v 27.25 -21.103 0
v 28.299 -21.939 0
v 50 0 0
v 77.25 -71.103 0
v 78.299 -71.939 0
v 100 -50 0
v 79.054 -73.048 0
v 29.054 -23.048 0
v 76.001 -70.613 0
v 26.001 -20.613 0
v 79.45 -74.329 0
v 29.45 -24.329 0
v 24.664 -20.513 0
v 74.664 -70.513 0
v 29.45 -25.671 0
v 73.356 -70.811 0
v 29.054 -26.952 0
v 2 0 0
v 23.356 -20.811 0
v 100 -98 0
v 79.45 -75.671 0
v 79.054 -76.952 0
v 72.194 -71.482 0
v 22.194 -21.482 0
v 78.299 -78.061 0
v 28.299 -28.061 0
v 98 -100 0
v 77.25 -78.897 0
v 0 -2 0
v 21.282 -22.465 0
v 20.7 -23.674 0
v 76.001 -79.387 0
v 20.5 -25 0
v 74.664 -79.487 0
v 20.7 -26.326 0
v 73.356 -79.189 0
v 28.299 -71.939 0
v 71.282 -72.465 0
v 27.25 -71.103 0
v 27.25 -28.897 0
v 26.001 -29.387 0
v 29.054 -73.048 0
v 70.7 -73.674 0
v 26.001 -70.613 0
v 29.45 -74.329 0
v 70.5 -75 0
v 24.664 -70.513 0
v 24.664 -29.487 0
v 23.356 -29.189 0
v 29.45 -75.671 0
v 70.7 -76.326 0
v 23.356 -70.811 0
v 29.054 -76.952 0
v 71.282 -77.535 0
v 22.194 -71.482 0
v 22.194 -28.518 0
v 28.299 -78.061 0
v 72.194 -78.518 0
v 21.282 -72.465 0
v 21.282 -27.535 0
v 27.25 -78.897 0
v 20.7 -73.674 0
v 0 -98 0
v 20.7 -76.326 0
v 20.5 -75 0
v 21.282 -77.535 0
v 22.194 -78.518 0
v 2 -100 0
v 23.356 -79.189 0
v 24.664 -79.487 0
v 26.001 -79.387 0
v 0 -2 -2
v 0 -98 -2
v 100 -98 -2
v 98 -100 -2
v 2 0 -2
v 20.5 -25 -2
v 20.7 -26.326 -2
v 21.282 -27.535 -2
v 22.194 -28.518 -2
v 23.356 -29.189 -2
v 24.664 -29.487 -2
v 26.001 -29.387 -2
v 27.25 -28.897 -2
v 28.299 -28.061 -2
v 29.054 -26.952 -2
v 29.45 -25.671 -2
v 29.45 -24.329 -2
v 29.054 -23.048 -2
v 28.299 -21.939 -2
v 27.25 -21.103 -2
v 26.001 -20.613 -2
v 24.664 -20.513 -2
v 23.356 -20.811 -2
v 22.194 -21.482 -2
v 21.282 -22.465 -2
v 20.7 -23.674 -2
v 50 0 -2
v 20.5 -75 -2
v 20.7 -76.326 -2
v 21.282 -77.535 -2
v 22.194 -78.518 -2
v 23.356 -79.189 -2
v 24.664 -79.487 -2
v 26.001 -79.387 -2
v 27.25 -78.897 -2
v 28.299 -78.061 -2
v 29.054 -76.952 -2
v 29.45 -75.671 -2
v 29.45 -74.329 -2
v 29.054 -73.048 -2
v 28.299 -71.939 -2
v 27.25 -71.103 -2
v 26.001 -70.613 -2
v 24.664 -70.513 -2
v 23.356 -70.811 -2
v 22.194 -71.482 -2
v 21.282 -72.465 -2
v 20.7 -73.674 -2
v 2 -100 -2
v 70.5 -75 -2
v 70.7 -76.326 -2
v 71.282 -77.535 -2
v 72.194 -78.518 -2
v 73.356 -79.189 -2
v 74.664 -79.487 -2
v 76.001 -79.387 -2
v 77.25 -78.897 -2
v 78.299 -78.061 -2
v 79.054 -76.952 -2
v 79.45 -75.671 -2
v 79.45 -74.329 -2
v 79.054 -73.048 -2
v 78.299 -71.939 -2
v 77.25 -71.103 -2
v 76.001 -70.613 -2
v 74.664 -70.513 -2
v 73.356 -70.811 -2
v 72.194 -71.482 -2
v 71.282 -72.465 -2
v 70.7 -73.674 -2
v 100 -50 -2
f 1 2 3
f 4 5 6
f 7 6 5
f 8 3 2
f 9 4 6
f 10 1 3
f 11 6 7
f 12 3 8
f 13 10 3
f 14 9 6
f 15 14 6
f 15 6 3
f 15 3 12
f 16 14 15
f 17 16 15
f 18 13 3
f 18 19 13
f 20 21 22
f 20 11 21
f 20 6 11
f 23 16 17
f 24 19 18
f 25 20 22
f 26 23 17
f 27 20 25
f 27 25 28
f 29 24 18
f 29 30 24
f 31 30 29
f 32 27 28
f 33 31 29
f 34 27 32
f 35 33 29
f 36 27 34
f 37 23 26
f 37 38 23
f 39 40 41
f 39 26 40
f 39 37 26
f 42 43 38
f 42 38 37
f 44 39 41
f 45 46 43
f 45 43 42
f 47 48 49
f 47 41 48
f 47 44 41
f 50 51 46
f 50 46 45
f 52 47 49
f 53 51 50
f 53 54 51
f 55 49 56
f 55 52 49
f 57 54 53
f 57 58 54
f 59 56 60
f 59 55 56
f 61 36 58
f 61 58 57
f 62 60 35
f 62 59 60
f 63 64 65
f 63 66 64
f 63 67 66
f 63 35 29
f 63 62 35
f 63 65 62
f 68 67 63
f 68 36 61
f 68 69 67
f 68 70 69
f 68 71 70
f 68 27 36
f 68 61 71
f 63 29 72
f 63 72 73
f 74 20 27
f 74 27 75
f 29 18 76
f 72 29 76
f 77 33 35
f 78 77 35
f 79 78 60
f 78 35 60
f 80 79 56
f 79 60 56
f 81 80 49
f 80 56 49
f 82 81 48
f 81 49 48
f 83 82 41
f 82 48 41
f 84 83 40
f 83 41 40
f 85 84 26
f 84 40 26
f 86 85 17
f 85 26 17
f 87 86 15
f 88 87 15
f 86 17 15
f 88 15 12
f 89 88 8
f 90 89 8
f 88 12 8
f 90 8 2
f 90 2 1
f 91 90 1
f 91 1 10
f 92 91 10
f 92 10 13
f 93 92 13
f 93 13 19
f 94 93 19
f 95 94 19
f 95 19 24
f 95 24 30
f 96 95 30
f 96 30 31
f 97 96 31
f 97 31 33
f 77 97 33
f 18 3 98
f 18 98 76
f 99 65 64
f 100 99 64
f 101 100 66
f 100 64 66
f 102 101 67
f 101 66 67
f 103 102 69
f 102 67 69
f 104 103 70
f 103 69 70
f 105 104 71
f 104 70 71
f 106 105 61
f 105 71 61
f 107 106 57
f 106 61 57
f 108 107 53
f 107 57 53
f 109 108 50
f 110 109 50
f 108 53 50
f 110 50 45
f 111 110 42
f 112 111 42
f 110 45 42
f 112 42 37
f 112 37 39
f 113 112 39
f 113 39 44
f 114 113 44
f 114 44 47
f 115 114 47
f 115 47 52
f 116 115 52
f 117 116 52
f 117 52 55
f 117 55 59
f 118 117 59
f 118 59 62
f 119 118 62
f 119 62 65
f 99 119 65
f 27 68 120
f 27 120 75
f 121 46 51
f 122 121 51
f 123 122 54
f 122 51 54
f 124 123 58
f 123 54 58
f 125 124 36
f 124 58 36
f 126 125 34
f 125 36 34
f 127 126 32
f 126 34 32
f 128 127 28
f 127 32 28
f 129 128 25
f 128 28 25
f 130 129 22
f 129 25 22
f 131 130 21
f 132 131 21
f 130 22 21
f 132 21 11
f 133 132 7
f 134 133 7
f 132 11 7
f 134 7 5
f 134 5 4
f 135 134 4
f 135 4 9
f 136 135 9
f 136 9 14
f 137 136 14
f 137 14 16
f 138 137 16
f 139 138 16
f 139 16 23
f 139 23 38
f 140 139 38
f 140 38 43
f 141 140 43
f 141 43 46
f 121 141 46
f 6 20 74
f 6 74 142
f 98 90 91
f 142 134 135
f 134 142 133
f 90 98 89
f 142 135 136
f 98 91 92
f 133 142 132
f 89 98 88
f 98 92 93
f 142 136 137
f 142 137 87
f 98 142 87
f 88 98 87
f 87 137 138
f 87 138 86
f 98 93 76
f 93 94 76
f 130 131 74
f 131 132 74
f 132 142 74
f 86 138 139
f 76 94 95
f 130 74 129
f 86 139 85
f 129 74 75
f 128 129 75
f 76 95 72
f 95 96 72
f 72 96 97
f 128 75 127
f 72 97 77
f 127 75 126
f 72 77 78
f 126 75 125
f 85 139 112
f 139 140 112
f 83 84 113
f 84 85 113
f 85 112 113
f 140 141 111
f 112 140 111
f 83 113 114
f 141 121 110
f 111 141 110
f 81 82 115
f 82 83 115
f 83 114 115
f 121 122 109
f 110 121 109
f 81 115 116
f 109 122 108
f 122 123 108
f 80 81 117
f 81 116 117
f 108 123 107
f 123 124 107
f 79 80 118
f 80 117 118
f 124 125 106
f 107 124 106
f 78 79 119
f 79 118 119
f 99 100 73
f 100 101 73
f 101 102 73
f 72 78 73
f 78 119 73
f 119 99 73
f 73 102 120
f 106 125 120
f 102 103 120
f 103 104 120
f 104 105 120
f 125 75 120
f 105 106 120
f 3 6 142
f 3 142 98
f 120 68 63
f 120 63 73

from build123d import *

# Parameters (mm, degrees)
EXTRUDE_1_DEPTH   = 2
HOLE_WIZARD_M81_D = 9
CHAMFER_1_SIZE    = 2


with BuildPart() as part:
    # Эскиз1 → Бобышка-Вытянуть1 (new body)
    with BuildSketch(Plane(origin=(0, 0, 0), x_dir=(1, 0, 0), z_dir=(0, 0, -1))):
        Polygon((0, 0), (0, 100), (100, 100), (100, 50), (50, 0), align=None)
    extrude(amount=EXTRUDE_1_DEPTH)

    # Отверстие с зазором M81 (through all)
    with Locations(Plane(origin=(0, 0, -2), x_dir=(1, 0, 0), z_dir=(0, 0, -1))):
        with Locations((25, 75), (25, 25), (75, 75)):
            Hole(HOLE_WIZARD_M81_D / 2)

    # Фаска1
    chamfer_1_edges = [part.edges().sort_by_distance(p)[0] for p in [
        (0, 0, -1),
        (0, -100, -1),
        (100, -100, -1),
    ]]
    chamfer(chamfer_1_edges, length=CHAMFER_1_SIZE)


solid = part.part
